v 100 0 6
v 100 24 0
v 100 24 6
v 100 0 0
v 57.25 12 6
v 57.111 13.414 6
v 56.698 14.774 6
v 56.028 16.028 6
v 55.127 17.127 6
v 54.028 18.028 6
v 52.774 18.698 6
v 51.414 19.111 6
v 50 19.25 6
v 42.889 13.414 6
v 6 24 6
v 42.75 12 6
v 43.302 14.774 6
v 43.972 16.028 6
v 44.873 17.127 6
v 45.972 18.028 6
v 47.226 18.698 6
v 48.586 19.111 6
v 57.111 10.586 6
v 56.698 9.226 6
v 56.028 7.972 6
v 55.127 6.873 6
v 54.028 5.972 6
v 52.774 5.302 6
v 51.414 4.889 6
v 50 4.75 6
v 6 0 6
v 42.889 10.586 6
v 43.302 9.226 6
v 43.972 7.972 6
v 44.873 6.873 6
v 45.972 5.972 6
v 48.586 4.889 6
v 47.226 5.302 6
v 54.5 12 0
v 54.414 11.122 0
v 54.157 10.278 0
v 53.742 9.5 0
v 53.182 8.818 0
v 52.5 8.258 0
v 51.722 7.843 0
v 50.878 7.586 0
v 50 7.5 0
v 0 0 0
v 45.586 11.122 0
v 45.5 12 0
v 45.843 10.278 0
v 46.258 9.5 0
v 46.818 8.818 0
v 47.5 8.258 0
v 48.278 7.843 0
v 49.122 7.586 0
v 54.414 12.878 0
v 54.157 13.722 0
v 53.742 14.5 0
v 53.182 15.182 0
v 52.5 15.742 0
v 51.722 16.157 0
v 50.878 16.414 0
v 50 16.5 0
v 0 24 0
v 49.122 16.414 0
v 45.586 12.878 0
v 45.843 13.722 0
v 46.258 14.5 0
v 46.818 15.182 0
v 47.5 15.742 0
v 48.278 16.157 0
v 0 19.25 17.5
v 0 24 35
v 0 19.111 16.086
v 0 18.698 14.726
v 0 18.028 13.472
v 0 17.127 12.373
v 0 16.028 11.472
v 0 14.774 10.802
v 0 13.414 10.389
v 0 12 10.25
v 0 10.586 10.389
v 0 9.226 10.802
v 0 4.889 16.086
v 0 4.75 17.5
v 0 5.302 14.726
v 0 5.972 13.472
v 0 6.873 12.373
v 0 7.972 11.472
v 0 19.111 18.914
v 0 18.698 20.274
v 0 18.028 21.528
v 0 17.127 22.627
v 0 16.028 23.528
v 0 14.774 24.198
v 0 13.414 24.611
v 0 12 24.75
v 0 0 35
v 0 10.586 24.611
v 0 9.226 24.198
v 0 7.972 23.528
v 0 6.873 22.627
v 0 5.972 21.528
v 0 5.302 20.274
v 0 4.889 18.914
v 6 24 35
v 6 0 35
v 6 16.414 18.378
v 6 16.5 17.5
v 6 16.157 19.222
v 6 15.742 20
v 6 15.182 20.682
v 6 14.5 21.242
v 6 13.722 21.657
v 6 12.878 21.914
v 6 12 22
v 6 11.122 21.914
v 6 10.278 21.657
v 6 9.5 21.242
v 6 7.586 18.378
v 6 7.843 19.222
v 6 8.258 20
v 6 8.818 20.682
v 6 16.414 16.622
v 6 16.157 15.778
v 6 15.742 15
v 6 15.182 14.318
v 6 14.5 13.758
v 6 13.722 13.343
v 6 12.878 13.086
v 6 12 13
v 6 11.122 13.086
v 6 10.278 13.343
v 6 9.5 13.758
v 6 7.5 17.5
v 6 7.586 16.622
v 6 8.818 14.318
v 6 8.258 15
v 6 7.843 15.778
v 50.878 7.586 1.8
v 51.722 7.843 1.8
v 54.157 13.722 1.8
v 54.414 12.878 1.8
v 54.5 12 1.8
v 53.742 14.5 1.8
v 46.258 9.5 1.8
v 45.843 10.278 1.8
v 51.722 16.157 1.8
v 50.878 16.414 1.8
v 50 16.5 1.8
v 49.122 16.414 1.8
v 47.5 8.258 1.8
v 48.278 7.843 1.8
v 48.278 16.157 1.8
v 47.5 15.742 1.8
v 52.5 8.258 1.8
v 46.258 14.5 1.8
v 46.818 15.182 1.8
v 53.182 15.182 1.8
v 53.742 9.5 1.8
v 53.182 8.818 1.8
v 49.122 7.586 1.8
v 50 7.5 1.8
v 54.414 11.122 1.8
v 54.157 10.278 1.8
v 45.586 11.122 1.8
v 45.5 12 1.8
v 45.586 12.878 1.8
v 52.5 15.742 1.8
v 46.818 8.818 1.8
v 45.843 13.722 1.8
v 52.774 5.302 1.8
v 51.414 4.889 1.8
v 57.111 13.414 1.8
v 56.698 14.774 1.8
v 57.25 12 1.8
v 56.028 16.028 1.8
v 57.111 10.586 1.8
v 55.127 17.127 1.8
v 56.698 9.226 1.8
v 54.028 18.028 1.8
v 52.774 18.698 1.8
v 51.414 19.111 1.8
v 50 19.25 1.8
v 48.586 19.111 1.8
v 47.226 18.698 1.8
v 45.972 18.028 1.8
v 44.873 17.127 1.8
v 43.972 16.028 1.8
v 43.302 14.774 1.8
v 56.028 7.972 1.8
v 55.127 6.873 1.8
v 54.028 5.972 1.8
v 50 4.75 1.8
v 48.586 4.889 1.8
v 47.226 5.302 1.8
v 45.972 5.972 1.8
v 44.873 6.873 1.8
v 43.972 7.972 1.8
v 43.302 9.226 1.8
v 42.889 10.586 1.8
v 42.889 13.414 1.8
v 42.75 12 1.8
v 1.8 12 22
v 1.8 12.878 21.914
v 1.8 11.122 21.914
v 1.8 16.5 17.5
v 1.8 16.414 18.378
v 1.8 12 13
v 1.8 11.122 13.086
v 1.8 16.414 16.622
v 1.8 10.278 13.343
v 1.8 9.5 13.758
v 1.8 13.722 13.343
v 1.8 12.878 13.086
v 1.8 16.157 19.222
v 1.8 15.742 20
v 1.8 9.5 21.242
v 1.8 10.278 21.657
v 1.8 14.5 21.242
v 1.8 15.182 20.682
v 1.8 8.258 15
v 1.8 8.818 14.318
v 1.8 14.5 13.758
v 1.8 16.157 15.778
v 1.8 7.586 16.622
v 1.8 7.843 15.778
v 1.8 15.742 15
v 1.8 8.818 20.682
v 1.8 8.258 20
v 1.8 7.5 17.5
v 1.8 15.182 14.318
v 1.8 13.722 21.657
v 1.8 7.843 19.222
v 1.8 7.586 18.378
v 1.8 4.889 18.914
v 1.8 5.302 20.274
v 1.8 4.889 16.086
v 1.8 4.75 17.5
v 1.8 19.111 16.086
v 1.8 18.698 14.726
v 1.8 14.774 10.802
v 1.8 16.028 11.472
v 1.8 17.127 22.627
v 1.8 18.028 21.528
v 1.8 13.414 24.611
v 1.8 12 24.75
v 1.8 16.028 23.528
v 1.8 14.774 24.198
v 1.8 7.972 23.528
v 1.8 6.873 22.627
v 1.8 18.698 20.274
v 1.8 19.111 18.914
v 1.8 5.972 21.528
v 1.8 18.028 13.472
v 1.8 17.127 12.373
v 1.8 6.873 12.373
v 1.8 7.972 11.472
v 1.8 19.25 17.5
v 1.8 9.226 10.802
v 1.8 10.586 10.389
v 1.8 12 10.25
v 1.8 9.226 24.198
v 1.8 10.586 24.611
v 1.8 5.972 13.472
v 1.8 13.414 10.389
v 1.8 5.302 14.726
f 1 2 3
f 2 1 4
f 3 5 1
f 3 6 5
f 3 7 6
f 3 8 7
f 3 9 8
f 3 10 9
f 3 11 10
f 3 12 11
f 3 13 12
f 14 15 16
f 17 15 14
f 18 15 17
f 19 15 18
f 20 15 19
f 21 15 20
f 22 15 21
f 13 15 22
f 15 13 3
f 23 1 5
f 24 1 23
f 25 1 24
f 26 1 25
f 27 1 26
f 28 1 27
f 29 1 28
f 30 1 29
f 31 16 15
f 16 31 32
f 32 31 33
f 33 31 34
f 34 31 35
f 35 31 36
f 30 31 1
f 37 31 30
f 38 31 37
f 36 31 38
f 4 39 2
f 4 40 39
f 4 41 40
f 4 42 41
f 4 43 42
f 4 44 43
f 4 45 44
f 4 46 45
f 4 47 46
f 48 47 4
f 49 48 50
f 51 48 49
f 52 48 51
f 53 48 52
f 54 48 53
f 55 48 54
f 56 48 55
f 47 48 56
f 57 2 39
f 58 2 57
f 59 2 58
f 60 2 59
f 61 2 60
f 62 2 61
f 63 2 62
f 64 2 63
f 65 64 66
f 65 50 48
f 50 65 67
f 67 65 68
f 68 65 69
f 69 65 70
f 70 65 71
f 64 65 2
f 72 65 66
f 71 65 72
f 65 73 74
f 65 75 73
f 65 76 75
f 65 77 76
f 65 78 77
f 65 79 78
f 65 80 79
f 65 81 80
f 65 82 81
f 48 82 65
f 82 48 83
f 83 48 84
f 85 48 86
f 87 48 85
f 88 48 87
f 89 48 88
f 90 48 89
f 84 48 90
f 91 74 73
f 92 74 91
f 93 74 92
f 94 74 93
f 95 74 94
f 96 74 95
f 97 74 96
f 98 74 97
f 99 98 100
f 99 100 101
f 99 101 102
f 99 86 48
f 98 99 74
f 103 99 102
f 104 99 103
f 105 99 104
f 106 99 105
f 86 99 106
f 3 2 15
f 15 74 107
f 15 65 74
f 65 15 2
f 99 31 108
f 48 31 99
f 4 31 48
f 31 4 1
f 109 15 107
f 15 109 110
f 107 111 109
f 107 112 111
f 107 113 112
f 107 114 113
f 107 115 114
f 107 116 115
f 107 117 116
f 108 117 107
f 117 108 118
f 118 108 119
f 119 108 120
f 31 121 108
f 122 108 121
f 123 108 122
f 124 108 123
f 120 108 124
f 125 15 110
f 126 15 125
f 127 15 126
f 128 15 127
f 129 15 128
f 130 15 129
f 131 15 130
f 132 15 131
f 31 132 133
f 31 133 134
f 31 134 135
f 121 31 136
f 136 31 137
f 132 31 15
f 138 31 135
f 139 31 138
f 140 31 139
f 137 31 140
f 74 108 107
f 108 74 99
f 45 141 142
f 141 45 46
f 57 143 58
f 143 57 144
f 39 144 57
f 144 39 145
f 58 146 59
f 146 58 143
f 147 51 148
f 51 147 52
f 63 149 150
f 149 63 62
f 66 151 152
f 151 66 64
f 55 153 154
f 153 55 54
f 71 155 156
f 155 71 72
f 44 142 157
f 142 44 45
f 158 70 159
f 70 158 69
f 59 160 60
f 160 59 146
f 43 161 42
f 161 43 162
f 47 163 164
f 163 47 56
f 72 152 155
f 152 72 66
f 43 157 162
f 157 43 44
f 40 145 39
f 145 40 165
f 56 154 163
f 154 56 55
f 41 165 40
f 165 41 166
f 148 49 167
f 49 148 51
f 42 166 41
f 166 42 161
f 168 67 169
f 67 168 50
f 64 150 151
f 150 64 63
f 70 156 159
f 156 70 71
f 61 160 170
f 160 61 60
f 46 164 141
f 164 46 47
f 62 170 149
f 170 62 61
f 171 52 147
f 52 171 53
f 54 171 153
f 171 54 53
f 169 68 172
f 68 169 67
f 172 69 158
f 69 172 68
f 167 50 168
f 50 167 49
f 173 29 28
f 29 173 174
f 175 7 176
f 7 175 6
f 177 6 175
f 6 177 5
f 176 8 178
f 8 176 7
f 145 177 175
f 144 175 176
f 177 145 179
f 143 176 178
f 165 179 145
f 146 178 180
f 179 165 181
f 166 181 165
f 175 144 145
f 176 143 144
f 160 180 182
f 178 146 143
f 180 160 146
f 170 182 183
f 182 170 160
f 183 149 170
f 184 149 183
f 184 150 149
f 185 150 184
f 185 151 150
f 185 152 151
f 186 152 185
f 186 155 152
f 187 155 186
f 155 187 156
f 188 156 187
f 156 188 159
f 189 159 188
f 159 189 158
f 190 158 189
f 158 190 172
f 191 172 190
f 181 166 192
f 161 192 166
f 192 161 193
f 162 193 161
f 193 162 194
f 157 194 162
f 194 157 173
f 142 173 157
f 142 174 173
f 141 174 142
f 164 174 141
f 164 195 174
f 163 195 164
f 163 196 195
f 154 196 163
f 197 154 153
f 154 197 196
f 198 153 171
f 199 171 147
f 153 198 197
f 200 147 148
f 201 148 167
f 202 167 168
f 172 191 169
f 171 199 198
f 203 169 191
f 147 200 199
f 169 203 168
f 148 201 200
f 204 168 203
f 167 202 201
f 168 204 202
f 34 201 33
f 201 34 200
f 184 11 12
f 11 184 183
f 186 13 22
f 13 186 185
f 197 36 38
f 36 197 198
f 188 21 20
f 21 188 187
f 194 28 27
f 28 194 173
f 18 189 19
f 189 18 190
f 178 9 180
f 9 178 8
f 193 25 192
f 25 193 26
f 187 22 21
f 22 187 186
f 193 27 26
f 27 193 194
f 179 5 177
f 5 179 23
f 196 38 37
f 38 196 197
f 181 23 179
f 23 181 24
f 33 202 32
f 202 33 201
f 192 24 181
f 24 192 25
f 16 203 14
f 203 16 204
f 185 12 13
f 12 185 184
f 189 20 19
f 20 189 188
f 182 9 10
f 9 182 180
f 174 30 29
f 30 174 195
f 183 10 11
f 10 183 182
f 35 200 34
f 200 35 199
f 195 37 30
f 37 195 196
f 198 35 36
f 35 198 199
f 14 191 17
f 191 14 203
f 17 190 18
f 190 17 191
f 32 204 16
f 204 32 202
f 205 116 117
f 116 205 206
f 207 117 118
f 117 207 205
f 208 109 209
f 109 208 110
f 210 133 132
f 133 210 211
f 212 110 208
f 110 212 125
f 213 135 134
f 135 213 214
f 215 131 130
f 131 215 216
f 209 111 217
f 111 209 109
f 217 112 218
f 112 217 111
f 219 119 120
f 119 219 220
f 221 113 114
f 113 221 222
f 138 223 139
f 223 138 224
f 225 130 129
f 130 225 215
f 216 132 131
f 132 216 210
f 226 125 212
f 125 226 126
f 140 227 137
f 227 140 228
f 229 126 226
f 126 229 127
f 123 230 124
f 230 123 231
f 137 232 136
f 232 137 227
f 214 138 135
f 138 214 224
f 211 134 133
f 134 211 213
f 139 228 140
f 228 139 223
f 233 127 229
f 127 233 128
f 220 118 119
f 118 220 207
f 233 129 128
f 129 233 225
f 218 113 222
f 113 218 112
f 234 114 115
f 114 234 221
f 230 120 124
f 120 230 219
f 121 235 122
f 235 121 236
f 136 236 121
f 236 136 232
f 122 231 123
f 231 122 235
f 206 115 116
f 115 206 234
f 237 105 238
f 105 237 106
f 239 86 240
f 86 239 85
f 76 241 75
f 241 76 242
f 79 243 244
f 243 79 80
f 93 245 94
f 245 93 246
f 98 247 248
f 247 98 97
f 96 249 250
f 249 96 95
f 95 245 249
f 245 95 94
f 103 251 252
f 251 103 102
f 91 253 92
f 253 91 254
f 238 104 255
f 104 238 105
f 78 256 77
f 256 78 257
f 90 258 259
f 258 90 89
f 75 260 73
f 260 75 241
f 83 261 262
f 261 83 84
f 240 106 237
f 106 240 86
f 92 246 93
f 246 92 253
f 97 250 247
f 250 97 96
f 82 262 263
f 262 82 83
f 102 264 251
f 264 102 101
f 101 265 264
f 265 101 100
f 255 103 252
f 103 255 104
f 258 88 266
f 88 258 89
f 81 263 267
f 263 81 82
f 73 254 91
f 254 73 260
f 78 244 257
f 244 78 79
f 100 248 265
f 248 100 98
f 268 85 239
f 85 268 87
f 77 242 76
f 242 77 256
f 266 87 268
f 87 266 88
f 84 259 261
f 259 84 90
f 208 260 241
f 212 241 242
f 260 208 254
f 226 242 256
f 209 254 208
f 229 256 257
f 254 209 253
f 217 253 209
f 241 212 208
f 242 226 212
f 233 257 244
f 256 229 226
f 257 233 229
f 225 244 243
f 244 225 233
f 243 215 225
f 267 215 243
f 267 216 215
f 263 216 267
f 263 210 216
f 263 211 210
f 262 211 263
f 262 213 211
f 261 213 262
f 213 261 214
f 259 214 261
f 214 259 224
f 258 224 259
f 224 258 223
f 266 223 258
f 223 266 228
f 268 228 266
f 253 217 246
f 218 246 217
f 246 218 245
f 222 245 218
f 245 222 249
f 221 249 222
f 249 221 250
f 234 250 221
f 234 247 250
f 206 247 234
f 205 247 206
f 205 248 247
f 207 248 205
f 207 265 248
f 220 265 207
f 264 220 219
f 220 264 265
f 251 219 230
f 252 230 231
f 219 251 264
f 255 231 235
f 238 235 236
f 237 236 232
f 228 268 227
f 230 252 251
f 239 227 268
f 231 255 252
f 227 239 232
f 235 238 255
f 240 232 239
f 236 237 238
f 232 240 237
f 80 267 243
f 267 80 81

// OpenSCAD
$fn = 32;

// ----------------------------------------------------------------------
// L-bracket: 100 x 24 x 35 mm
// ----------------------------------------------------------------------

// --- parameters (mm) ---
run_out = 100;            // horizontal leg, X
rise = 35;                // vertical leg, Z
bracket_w = 24;           // bracket depth, Y
sheet_t = 6;              // plate thickness
hole_d = 9;               // clearance for M8
cb_d = 14.5;              // counterbore seat
cb_h = 4.2;               // counterbore depth

module hole_z(px, py) {
  translate([px, py, -0.5]) cylinder(h = sheet_t + 1, d = hole_d);
}
module hole_x(pz, py) {
  translate([-0.5, py, pz]) rotate([0, 90, 0]) cylinder(h = sheet_t + 1, d = hole_d);
}
module cb_z(px, py) {
  translate([px, py, sheet_t - cb_h]) cylinder(h = cb_h + 0.4, d = cb_d);
}
module cb_x(pz, py) {
  translate([sheet_t - cb_h, py, pz]) rotate([0, -90, 0]) cylinder(h = cb_h + 0.4, d = cb_d);
}

difference() {
  union() {
    /* horizontal leg */
    cube([run_out, bracket_w, sheet_t]);
    /* vertical leg, overlapping the corner block */
    cube([sheet_t, bracket_w, rise]);
  }
  hole_z(50, 12);
  cb_z(50, 12);
  hole_x(17.5, 12);
  cb_x(17.5, 12);
}
